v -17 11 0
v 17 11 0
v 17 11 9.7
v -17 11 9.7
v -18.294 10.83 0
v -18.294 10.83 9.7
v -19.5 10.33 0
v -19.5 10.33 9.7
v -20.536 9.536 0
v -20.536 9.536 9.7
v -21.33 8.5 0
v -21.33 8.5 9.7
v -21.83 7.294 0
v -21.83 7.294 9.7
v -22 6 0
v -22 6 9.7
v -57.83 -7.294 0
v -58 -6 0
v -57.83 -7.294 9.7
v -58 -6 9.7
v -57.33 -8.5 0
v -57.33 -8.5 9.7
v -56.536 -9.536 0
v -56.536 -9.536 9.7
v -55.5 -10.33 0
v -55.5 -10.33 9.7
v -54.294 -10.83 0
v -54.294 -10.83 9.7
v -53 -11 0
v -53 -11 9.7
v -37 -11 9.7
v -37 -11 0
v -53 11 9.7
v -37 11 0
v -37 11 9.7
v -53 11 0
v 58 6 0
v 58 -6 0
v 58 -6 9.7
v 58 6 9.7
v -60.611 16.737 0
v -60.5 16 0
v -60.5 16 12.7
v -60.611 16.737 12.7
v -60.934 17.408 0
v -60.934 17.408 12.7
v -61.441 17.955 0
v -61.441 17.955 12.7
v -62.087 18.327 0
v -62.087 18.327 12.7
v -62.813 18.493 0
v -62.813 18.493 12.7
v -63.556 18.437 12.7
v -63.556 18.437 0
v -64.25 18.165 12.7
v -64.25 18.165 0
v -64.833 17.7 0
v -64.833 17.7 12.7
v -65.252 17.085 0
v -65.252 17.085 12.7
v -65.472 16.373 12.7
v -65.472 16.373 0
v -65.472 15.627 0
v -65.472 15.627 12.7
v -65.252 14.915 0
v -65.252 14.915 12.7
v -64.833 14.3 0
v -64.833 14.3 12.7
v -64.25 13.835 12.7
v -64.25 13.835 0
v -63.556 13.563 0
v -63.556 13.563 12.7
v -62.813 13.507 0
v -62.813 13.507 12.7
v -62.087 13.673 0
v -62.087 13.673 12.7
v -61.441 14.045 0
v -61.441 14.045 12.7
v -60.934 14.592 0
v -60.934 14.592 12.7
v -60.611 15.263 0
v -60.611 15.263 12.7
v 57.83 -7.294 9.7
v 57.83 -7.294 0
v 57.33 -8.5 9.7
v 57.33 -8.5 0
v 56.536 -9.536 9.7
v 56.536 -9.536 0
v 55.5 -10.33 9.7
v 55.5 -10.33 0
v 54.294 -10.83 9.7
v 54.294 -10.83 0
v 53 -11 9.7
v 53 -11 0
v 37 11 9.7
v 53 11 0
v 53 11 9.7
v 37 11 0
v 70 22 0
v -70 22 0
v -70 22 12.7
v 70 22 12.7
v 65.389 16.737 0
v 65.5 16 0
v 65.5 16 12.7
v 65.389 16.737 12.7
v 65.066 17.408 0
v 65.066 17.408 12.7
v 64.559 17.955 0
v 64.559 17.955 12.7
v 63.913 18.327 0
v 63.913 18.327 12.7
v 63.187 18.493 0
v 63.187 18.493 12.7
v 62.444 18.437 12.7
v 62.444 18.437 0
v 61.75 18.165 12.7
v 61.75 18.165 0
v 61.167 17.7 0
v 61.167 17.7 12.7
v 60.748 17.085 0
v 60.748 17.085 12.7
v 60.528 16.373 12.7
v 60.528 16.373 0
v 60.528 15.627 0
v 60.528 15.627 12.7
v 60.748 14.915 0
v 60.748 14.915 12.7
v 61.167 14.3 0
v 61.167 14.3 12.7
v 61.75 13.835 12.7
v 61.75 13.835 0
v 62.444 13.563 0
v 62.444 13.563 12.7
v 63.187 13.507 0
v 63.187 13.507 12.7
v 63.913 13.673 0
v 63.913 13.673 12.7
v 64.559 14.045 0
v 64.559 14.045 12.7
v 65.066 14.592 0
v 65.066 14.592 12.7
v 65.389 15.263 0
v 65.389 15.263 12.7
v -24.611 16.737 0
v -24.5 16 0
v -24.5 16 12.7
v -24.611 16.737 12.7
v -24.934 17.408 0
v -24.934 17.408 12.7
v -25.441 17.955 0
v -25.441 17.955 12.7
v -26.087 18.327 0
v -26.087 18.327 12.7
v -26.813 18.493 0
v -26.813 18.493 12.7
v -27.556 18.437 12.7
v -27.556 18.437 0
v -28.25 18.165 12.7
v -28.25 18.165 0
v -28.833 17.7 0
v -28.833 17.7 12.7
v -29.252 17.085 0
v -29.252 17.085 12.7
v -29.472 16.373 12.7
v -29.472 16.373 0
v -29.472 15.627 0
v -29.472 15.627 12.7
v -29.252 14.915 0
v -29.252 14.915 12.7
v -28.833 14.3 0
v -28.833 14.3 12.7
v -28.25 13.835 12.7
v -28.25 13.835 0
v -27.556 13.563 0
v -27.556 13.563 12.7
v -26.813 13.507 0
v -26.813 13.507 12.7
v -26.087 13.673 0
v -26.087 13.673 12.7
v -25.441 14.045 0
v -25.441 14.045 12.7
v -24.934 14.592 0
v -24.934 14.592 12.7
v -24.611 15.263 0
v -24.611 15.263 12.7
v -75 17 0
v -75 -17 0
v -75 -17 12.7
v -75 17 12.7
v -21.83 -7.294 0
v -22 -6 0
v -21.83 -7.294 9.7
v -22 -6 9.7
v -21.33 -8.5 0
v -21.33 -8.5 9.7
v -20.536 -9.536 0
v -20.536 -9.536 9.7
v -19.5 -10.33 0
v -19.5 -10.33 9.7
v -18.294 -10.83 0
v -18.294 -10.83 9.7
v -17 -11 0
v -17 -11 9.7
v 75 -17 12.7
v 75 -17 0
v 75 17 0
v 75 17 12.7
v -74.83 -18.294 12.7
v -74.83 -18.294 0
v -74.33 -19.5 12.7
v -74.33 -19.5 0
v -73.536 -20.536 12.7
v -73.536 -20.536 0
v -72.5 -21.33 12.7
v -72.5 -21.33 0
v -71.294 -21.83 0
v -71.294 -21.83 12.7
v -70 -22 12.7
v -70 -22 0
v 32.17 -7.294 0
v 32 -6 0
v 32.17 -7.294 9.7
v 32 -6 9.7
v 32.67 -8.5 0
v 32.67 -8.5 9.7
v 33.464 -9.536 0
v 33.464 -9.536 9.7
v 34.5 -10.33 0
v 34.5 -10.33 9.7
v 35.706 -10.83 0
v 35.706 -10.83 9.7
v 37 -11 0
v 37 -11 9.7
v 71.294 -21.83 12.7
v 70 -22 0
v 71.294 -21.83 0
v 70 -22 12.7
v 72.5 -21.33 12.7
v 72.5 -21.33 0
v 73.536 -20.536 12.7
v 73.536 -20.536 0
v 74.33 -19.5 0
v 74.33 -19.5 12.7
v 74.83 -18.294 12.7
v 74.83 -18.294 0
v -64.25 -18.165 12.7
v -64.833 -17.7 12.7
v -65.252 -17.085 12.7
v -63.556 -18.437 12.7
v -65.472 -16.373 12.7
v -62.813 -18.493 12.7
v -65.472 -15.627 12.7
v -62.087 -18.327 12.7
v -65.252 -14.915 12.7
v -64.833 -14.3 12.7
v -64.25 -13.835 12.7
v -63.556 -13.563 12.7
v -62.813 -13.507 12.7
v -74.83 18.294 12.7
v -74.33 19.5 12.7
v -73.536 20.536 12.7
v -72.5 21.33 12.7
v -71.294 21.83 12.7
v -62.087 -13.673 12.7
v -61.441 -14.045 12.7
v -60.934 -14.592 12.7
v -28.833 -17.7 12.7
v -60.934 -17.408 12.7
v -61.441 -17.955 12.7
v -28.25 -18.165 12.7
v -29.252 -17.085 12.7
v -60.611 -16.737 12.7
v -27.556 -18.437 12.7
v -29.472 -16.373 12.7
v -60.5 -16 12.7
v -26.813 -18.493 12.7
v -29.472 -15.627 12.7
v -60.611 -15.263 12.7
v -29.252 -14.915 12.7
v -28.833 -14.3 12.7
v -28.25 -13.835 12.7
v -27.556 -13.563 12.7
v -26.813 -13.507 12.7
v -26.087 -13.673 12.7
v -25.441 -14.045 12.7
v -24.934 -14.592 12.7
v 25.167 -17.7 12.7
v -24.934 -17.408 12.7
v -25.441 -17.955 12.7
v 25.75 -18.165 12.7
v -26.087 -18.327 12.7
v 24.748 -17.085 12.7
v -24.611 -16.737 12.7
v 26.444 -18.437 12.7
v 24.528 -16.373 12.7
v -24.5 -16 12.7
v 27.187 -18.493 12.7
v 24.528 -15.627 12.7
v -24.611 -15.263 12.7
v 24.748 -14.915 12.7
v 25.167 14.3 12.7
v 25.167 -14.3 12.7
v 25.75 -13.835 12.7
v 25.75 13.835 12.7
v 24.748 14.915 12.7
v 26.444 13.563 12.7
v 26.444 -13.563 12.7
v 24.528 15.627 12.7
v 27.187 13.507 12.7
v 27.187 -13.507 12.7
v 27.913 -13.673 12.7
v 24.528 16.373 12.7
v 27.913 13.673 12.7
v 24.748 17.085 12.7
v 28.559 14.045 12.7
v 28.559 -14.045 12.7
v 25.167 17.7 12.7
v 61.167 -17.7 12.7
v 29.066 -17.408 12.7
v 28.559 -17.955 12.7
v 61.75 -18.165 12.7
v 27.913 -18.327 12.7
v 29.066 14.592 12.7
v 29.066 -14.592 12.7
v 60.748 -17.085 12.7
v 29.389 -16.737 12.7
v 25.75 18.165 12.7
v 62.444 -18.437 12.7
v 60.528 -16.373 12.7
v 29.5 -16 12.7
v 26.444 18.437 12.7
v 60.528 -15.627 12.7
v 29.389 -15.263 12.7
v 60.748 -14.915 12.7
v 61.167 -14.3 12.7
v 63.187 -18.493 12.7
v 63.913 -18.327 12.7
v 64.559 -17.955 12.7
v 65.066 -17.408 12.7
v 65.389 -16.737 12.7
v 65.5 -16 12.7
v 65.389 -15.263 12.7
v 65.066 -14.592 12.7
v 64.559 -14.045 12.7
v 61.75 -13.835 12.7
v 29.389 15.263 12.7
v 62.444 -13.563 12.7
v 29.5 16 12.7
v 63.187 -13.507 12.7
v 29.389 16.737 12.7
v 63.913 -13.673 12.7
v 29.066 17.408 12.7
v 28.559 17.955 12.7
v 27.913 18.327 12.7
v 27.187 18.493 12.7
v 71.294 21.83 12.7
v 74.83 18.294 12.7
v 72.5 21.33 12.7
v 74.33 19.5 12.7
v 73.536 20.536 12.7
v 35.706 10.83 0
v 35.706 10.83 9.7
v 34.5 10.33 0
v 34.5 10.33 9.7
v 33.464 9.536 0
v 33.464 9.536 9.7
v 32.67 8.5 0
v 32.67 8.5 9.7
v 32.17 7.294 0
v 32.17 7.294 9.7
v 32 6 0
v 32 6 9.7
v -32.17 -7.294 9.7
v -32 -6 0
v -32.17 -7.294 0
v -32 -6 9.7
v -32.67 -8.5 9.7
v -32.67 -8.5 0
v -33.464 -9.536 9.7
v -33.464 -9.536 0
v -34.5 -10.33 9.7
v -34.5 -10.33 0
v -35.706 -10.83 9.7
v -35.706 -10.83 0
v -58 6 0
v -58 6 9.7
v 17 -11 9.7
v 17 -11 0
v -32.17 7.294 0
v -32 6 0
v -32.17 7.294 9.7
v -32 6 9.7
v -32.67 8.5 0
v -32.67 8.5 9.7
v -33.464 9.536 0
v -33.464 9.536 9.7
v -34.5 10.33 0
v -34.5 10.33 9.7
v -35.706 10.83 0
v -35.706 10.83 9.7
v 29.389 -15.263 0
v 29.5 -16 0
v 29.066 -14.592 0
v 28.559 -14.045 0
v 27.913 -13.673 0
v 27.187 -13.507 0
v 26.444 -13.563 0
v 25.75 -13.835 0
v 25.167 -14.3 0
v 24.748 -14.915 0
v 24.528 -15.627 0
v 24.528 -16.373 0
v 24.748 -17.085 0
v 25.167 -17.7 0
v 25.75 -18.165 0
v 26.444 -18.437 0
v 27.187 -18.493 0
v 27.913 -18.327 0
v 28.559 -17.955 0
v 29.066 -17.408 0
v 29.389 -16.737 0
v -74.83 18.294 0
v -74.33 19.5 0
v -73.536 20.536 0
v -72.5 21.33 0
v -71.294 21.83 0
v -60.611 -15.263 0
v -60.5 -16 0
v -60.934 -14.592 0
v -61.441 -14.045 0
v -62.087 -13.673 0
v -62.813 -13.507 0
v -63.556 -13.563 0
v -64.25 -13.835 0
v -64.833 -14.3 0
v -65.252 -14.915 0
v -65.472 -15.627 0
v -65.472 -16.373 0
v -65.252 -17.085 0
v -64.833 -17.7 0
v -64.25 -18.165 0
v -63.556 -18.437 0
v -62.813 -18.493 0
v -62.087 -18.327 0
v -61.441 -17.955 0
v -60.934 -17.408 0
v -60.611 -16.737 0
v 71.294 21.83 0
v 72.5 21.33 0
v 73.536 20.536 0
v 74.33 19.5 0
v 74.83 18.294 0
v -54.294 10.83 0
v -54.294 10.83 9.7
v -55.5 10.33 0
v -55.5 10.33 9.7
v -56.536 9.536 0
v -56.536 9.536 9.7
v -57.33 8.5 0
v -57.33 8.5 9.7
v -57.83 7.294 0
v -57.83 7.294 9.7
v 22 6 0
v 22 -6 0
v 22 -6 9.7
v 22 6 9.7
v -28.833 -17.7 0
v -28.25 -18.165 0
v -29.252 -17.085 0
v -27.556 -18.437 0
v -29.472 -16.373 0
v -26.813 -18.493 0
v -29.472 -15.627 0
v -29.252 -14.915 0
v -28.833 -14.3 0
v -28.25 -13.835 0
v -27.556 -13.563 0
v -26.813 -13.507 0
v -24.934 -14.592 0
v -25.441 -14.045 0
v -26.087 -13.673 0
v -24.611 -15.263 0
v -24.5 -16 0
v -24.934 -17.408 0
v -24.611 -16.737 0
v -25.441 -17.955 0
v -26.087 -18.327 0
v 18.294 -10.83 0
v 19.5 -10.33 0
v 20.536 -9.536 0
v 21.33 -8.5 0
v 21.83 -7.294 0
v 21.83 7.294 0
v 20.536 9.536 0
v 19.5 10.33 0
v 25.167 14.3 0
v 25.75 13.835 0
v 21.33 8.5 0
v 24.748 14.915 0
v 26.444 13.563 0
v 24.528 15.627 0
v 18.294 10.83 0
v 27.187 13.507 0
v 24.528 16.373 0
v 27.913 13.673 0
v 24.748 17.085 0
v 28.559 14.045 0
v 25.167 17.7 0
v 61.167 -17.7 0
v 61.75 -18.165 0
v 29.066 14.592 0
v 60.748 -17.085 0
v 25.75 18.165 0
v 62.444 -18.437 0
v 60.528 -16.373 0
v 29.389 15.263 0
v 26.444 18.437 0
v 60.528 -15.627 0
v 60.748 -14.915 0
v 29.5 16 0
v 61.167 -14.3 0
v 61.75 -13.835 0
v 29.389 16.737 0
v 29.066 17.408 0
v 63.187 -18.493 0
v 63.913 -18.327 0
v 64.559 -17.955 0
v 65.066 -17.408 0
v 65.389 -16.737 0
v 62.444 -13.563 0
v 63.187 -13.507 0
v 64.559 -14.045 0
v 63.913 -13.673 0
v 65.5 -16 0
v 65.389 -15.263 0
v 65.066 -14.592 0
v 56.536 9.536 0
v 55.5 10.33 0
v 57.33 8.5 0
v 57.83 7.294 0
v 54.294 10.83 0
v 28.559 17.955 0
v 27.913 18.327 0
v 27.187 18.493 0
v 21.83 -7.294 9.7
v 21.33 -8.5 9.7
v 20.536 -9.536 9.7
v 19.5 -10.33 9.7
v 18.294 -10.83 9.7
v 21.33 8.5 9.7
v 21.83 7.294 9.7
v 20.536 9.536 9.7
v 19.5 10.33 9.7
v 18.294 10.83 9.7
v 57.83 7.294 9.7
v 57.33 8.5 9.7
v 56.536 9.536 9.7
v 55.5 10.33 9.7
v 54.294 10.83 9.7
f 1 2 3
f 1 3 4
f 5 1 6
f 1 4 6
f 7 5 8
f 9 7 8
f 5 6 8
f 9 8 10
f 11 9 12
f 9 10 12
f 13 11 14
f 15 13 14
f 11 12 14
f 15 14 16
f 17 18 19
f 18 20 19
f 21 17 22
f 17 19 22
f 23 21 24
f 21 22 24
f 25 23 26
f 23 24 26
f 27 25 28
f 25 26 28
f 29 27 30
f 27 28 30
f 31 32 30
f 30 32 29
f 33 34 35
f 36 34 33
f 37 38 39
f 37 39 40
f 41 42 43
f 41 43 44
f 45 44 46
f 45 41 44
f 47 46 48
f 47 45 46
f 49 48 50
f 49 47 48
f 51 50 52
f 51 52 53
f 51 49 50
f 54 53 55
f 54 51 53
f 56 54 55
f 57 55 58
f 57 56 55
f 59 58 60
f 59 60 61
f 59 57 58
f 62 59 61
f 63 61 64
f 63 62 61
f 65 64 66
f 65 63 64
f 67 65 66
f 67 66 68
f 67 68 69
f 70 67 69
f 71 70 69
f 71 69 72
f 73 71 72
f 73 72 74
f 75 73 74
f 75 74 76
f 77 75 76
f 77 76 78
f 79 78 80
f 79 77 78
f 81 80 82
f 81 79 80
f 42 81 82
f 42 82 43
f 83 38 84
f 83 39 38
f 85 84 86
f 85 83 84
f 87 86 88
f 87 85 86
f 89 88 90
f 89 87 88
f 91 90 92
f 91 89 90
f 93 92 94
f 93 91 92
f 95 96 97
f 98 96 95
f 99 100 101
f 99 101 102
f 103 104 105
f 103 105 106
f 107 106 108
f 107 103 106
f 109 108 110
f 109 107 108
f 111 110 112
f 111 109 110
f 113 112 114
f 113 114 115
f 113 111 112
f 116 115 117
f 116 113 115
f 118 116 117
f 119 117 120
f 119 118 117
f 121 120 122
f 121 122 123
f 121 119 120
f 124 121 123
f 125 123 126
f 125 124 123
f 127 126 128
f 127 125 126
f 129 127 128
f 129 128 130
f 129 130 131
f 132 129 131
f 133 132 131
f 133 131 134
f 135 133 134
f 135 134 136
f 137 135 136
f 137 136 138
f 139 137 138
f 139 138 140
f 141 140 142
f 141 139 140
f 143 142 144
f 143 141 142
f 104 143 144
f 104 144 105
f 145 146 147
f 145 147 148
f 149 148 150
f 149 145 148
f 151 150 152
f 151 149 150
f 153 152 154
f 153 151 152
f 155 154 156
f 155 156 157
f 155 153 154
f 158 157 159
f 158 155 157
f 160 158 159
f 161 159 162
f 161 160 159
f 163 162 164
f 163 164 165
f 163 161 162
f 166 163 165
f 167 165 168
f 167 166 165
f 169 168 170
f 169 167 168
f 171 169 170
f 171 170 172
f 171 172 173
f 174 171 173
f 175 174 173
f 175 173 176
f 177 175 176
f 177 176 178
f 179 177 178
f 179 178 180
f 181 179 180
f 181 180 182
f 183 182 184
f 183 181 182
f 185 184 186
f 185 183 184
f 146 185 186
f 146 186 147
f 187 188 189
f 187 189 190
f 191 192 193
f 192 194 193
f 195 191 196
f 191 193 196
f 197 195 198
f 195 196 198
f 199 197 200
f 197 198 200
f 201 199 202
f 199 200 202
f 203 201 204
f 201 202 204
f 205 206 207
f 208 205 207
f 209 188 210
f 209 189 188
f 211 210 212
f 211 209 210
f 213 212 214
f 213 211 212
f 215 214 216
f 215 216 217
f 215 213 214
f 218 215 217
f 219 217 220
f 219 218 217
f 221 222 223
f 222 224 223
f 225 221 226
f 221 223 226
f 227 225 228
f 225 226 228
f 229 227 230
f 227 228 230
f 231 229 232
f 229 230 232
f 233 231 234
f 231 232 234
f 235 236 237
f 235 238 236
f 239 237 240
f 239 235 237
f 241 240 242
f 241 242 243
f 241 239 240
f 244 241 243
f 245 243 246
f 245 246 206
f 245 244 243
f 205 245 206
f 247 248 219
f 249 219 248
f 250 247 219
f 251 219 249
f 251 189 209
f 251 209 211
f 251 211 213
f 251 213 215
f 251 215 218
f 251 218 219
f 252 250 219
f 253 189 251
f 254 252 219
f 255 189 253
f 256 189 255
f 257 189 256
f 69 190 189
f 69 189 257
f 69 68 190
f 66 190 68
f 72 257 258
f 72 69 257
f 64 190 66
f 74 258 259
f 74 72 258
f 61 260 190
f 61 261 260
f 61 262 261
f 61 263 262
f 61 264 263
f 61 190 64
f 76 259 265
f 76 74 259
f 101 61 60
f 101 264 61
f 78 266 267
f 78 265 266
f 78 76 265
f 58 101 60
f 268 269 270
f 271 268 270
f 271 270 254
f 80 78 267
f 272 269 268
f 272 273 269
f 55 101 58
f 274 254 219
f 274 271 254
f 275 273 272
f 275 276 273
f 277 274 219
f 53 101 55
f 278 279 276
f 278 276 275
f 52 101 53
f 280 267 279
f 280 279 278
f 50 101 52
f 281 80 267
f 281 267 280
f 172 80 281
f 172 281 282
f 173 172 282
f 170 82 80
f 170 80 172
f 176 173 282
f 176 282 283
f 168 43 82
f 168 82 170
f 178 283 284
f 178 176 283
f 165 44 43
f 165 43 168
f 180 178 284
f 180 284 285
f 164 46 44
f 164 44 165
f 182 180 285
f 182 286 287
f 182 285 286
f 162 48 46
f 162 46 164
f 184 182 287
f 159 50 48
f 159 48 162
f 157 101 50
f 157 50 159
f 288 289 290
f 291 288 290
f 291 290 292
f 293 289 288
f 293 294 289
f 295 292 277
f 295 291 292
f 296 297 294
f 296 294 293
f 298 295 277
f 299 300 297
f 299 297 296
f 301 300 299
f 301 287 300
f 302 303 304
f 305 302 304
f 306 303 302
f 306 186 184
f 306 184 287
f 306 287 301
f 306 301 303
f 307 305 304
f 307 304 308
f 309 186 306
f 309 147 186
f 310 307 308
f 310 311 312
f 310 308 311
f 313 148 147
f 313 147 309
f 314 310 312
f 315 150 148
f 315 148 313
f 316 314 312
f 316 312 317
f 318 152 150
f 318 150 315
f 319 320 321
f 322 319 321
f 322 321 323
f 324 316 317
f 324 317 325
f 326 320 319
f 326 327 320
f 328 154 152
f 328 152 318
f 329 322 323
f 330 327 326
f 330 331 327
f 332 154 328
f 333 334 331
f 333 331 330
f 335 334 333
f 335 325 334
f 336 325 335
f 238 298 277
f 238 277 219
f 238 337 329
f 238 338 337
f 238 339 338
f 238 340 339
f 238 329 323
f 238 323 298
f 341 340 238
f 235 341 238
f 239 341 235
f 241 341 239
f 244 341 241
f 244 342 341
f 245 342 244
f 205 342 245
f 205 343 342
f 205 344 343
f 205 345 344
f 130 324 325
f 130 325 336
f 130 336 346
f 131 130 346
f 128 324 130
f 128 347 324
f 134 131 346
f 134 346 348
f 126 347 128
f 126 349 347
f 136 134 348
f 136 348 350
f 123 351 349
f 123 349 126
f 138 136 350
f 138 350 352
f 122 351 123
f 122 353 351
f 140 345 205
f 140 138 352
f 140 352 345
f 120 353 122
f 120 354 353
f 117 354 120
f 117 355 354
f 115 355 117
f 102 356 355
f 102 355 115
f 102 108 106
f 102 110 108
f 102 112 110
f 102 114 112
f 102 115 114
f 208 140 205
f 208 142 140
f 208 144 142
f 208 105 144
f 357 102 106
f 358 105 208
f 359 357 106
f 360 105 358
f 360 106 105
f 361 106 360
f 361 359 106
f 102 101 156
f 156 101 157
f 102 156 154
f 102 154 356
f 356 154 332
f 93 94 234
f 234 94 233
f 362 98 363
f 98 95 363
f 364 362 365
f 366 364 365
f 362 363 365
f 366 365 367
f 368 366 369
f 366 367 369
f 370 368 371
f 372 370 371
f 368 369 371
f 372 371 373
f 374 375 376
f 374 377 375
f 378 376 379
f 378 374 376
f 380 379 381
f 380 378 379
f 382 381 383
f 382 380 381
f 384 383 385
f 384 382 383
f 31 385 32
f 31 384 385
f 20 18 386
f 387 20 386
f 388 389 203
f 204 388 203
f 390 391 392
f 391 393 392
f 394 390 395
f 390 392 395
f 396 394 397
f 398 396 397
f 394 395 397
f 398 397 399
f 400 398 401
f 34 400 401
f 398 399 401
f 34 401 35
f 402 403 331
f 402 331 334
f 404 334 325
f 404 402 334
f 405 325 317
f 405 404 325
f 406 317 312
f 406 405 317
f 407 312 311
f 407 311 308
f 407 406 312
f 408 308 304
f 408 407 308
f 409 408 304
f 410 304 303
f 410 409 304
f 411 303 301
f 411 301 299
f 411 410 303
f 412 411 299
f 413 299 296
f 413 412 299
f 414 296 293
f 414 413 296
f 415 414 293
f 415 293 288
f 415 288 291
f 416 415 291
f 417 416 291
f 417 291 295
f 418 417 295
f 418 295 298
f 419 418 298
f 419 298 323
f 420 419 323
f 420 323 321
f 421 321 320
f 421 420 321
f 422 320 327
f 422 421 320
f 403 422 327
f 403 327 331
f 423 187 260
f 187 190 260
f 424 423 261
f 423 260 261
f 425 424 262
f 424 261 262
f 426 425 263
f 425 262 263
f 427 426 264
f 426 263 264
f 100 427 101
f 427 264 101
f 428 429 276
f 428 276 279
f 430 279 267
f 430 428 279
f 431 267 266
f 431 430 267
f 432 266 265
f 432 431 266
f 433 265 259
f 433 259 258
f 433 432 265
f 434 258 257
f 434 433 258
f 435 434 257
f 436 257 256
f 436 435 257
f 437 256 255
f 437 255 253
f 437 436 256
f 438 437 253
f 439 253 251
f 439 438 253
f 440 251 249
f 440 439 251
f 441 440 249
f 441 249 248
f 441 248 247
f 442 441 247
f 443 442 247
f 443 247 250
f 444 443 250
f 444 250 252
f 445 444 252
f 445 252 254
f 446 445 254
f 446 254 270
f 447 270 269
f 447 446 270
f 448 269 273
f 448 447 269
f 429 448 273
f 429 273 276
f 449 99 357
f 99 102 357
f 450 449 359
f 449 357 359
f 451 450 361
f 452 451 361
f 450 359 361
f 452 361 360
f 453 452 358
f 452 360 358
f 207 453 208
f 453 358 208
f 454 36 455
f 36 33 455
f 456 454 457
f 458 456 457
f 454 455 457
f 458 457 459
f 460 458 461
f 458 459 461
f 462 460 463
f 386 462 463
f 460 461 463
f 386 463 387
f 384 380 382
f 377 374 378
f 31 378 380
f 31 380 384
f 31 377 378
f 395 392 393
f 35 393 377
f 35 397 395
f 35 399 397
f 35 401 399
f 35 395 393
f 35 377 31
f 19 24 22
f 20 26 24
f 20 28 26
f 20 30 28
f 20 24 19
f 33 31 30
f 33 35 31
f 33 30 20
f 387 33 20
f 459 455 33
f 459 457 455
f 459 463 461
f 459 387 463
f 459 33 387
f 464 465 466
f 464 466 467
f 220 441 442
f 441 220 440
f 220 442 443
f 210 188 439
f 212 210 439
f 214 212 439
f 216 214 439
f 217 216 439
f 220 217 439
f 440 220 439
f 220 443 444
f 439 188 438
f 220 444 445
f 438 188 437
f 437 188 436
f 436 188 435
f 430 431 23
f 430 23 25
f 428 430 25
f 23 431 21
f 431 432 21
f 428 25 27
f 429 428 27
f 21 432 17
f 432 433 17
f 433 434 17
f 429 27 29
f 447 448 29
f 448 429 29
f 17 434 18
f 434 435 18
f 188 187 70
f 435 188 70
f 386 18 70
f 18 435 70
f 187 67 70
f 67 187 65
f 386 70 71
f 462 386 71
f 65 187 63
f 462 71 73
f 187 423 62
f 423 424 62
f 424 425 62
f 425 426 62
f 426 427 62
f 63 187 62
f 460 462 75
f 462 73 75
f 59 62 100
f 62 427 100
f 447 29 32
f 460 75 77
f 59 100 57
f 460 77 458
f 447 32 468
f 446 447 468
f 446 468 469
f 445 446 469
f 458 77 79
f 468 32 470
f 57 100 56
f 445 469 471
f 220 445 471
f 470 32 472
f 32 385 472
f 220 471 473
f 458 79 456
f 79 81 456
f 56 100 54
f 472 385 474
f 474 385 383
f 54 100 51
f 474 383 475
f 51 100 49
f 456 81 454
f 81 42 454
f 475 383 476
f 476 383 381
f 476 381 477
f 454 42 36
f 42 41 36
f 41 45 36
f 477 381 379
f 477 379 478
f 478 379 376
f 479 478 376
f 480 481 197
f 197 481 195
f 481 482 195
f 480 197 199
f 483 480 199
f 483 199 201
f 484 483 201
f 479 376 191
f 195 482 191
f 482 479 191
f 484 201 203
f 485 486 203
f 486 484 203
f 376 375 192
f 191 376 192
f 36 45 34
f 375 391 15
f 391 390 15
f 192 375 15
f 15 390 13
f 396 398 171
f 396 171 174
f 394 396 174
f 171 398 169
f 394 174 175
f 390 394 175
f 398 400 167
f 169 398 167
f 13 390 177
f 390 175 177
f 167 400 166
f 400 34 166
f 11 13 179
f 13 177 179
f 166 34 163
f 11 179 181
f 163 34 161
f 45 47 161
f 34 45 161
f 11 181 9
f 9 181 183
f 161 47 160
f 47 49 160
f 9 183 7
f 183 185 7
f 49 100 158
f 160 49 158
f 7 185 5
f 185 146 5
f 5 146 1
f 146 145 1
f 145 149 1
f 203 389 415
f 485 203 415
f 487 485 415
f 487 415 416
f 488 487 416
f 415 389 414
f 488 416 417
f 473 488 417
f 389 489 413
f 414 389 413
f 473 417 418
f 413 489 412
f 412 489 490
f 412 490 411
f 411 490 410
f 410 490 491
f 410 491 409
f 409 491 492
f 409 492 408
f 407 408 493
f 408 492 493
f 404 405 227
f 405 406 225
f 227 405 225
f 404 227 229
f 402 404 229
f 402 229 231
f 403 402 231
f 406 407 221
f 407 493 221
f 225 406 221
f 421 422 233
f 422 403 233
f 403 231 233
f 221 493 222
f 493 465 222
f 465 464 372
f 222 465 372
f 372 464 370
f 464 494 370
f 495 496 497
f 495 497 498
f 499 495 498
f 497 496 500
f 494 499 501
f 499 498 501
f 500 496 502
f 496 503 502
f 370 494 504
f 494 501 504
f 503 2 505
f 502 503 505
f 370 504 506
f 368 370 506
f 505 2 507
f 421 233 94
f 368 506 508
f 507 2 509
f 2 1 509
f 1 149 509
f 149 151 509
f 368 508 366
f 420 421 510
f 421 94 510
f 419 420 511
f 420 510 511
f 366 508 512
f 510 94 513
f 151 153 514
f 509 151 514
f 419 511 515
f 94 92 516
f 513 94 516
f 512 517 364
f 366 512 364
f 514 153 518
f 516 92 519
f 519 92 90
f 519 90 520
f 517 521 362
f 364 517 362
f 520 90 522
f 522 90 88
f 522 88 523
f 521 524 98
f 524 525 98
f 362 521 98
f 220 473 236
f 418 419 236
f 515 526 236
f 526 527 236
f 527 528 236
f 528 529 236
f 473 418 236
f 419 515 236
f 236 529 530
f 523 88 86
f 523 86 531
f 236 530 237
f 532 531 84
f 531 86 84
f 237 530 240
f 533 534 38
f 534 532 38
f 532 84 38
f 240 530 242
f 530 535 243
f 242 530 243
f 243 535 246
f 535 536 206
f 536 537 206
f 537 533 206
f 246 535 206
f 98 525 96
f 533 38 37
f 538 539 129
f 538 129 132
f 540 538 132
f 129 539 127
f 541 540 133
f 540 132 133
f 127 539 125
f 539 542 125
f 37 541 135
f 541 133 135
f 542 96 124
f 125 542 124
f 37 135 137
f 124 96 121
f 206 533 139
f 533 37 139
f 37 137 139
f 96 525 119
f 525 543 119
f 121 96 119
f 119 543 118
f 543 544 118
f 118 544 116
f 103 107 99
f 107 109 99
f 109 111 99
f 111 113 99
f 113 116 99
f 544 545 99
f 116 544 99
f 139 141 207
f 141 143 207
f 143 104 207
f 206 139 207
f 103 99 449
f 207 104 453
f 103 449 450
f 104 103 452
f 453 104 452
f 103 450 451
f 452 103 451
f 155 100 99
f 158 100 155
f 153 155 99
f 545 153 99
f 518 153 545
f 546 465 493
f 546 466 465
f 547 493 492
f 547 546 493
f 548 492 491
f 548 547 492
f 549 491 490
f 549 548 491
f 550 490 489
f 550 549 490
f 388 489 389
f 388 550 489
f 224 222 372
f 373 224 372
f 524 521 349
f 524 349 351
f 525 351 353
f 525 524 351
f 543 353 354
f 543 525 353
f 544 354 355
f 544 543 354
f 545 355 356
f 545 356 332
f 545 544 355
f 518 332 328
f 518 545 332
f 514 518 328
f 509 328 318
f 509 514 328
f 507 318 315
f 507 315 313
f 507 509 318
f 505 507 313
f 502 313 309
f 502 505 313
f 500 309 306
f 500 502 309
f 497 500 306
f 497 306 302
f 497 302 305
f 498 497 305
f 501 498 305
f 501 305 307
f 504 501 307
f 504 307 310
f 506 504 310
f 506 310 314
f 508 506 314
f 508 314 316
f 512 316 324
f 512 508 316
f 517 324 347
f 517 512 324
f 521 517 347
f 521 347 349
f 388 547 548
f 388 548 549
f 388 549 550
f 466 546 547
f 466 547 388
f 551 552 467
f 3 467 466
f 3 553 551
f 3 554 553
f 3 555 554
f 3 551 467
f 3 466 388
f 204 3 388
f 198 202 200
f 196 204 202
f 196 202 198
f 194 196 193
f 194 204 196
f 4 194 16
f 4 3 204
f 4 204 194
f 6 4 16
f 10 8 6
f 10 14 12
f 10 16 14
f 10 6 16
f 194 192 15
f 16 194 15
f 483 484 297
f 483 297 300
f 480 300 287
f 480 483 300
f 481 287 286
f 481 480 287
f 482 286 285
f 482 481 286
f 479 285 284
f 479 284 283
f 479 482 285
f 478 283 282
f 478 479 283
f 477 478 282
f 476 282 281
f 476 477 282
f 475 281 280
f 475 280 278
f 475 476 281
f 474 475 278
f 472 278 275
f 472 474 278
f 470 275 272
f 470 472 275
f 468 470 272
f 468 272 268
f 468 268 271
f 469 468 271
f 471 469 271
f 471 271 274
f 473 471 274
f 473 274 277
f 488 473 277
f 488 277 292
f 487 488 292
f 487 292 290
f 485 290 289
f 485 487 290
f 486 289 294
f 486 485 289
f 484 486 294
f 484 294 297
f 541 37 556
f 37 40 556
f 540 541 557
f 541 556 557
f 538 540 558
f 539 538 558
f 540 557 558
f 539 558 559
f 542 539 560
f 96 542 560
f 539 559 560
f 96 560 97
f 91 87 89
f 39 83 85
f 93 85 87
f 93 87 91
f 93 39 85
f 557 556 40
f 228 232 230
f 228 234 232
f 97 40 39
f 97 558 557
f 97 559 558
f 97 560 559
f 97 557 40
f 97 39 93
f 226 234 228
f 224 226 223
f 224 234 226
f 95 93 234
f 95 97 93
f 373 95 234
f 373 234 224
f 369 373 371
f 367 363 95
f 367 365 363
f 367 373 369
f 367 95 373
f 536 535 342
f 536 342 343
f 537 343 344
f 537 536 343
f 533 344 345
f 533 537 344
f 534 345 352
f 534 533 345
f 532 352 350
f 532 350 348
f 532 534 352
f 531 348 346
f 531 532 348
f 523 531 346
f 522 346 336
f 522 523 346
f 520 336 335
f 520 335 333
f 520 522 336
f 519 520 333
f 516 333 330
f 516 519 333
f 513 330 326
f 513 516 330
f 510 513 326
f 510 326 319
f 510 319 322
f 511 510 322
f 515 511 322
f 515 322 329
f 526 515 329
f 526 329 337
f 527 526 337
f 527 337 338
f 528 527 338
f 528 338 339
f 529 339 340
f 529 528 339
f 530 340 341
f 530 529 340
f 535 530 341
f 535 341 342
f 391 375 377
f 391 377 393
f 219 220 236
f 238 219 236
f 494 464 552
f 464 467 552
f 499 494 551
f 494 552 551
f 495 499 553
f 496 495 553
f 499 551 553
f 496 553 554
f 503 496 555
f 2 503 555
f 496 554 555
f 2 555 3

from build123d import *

# Parameters (mm, degrees)
SKETCH1_W           = 150
SKETCH1_H           = 44
SKETCH1_R           = 2.5
BOSS_EXTRUDE1_DEPTH = 12.7
FILLET1_R           = 5
SKETCH7_W           = 26
SKETCH7_H           = 22
SKETCH7_W_2         = 44
CUT_EXTRUDE2_DEPTH  = 9.7
FILLET3_R           = 5


with BuildPart() as part:
    # Sketch1 → Boss-Extrude1 (new body)
    with BuildSketch(Plane.XY):
        Rectangle(SKETCH1_W, SKETCH1_H)
        with Locations((-63, -16)):
            Circle(SKETCH1_R, mode=Mode.SUBTRACT)
        with Locations((-63, 16)):
            Circle(SKETCH1_R, mode=Mode.SUBTRACT)
        with Locations((-27, -16)):
            Circle(SKETCH1_R, mode=Mode.SUBTRACT)
        with Locations((-27, 16)):
            Circle(SKETCH1_R, mode=Mode.SUBTRACT)
        with Locations((27, -16)):
            Circle(SKETCH1_R, mode=Mode.SUBTRACT)
        with Locations((27, 16)):
            Circle(SKETCH1_R, mode=Mode.SUBTRACT)
        with Locations((63, -16)):
            Circle(SKETCH1_R, mode=Mode.SUBTRACT)
        with Locations((63, 16)):
            Circle(SKETCH1_R, mode=Mode.SUBTRACT)
    extrude(amount=BOSS_EXTRUDE1_DEPTH)

    # Fillet1
    fillet1_edges = [part.edges().sort_by_distance(p)[0] for p in [
        (75, -22, 6.35),
        (-75, -22, 6.35),
        (-75, 22, 6.35),
        (75, 22, 6.35),
    ]]
    fillet(fillet1_edges, radius=FILLET1_R)

    # Sketch7 → Cut-Extrude2 (cut)
    with BuildSketch(Plane(origin=(0, 0, 0), x_dir=(-1, 0, 0), z_dir=(0, 0, -1))):
        with Locations((-45, 0)):
            Rectangle(SKETCH7_W, SKETCH7_H)
        Rectangle(SKETCH7_W_2, SKETCH7_H)
        with Locations((45, 0)):
            Rectangle(SKETCH7_W, SKETCH7_H)
    extrude(amount=-CUT_EXTRUDE2_DEPTH, mode=Mode.SUBTRACT)

    # Fillet3
    fillet3_edges = [part.edges().sort_by_distance(p)[0] for p in [
        (58, -11, 4.85),
        (58, 11, 4.85),
        (32, 11, 4.85),
        (32, -11, 4.85),
        (22, -11, 4.85),
        (22, 11, 4.85),
        (-22, 11, 4.85),
        (-22, -11, 4.85),
        (-32, -11, 4.85),
        (-32, 11, 4.85),
        (-58, 11, 4.85),
        (-58, -11, 4.85),
    ]]
    fillet(fillet3_edges, radius=FILLET3_R)


solid = part.part
